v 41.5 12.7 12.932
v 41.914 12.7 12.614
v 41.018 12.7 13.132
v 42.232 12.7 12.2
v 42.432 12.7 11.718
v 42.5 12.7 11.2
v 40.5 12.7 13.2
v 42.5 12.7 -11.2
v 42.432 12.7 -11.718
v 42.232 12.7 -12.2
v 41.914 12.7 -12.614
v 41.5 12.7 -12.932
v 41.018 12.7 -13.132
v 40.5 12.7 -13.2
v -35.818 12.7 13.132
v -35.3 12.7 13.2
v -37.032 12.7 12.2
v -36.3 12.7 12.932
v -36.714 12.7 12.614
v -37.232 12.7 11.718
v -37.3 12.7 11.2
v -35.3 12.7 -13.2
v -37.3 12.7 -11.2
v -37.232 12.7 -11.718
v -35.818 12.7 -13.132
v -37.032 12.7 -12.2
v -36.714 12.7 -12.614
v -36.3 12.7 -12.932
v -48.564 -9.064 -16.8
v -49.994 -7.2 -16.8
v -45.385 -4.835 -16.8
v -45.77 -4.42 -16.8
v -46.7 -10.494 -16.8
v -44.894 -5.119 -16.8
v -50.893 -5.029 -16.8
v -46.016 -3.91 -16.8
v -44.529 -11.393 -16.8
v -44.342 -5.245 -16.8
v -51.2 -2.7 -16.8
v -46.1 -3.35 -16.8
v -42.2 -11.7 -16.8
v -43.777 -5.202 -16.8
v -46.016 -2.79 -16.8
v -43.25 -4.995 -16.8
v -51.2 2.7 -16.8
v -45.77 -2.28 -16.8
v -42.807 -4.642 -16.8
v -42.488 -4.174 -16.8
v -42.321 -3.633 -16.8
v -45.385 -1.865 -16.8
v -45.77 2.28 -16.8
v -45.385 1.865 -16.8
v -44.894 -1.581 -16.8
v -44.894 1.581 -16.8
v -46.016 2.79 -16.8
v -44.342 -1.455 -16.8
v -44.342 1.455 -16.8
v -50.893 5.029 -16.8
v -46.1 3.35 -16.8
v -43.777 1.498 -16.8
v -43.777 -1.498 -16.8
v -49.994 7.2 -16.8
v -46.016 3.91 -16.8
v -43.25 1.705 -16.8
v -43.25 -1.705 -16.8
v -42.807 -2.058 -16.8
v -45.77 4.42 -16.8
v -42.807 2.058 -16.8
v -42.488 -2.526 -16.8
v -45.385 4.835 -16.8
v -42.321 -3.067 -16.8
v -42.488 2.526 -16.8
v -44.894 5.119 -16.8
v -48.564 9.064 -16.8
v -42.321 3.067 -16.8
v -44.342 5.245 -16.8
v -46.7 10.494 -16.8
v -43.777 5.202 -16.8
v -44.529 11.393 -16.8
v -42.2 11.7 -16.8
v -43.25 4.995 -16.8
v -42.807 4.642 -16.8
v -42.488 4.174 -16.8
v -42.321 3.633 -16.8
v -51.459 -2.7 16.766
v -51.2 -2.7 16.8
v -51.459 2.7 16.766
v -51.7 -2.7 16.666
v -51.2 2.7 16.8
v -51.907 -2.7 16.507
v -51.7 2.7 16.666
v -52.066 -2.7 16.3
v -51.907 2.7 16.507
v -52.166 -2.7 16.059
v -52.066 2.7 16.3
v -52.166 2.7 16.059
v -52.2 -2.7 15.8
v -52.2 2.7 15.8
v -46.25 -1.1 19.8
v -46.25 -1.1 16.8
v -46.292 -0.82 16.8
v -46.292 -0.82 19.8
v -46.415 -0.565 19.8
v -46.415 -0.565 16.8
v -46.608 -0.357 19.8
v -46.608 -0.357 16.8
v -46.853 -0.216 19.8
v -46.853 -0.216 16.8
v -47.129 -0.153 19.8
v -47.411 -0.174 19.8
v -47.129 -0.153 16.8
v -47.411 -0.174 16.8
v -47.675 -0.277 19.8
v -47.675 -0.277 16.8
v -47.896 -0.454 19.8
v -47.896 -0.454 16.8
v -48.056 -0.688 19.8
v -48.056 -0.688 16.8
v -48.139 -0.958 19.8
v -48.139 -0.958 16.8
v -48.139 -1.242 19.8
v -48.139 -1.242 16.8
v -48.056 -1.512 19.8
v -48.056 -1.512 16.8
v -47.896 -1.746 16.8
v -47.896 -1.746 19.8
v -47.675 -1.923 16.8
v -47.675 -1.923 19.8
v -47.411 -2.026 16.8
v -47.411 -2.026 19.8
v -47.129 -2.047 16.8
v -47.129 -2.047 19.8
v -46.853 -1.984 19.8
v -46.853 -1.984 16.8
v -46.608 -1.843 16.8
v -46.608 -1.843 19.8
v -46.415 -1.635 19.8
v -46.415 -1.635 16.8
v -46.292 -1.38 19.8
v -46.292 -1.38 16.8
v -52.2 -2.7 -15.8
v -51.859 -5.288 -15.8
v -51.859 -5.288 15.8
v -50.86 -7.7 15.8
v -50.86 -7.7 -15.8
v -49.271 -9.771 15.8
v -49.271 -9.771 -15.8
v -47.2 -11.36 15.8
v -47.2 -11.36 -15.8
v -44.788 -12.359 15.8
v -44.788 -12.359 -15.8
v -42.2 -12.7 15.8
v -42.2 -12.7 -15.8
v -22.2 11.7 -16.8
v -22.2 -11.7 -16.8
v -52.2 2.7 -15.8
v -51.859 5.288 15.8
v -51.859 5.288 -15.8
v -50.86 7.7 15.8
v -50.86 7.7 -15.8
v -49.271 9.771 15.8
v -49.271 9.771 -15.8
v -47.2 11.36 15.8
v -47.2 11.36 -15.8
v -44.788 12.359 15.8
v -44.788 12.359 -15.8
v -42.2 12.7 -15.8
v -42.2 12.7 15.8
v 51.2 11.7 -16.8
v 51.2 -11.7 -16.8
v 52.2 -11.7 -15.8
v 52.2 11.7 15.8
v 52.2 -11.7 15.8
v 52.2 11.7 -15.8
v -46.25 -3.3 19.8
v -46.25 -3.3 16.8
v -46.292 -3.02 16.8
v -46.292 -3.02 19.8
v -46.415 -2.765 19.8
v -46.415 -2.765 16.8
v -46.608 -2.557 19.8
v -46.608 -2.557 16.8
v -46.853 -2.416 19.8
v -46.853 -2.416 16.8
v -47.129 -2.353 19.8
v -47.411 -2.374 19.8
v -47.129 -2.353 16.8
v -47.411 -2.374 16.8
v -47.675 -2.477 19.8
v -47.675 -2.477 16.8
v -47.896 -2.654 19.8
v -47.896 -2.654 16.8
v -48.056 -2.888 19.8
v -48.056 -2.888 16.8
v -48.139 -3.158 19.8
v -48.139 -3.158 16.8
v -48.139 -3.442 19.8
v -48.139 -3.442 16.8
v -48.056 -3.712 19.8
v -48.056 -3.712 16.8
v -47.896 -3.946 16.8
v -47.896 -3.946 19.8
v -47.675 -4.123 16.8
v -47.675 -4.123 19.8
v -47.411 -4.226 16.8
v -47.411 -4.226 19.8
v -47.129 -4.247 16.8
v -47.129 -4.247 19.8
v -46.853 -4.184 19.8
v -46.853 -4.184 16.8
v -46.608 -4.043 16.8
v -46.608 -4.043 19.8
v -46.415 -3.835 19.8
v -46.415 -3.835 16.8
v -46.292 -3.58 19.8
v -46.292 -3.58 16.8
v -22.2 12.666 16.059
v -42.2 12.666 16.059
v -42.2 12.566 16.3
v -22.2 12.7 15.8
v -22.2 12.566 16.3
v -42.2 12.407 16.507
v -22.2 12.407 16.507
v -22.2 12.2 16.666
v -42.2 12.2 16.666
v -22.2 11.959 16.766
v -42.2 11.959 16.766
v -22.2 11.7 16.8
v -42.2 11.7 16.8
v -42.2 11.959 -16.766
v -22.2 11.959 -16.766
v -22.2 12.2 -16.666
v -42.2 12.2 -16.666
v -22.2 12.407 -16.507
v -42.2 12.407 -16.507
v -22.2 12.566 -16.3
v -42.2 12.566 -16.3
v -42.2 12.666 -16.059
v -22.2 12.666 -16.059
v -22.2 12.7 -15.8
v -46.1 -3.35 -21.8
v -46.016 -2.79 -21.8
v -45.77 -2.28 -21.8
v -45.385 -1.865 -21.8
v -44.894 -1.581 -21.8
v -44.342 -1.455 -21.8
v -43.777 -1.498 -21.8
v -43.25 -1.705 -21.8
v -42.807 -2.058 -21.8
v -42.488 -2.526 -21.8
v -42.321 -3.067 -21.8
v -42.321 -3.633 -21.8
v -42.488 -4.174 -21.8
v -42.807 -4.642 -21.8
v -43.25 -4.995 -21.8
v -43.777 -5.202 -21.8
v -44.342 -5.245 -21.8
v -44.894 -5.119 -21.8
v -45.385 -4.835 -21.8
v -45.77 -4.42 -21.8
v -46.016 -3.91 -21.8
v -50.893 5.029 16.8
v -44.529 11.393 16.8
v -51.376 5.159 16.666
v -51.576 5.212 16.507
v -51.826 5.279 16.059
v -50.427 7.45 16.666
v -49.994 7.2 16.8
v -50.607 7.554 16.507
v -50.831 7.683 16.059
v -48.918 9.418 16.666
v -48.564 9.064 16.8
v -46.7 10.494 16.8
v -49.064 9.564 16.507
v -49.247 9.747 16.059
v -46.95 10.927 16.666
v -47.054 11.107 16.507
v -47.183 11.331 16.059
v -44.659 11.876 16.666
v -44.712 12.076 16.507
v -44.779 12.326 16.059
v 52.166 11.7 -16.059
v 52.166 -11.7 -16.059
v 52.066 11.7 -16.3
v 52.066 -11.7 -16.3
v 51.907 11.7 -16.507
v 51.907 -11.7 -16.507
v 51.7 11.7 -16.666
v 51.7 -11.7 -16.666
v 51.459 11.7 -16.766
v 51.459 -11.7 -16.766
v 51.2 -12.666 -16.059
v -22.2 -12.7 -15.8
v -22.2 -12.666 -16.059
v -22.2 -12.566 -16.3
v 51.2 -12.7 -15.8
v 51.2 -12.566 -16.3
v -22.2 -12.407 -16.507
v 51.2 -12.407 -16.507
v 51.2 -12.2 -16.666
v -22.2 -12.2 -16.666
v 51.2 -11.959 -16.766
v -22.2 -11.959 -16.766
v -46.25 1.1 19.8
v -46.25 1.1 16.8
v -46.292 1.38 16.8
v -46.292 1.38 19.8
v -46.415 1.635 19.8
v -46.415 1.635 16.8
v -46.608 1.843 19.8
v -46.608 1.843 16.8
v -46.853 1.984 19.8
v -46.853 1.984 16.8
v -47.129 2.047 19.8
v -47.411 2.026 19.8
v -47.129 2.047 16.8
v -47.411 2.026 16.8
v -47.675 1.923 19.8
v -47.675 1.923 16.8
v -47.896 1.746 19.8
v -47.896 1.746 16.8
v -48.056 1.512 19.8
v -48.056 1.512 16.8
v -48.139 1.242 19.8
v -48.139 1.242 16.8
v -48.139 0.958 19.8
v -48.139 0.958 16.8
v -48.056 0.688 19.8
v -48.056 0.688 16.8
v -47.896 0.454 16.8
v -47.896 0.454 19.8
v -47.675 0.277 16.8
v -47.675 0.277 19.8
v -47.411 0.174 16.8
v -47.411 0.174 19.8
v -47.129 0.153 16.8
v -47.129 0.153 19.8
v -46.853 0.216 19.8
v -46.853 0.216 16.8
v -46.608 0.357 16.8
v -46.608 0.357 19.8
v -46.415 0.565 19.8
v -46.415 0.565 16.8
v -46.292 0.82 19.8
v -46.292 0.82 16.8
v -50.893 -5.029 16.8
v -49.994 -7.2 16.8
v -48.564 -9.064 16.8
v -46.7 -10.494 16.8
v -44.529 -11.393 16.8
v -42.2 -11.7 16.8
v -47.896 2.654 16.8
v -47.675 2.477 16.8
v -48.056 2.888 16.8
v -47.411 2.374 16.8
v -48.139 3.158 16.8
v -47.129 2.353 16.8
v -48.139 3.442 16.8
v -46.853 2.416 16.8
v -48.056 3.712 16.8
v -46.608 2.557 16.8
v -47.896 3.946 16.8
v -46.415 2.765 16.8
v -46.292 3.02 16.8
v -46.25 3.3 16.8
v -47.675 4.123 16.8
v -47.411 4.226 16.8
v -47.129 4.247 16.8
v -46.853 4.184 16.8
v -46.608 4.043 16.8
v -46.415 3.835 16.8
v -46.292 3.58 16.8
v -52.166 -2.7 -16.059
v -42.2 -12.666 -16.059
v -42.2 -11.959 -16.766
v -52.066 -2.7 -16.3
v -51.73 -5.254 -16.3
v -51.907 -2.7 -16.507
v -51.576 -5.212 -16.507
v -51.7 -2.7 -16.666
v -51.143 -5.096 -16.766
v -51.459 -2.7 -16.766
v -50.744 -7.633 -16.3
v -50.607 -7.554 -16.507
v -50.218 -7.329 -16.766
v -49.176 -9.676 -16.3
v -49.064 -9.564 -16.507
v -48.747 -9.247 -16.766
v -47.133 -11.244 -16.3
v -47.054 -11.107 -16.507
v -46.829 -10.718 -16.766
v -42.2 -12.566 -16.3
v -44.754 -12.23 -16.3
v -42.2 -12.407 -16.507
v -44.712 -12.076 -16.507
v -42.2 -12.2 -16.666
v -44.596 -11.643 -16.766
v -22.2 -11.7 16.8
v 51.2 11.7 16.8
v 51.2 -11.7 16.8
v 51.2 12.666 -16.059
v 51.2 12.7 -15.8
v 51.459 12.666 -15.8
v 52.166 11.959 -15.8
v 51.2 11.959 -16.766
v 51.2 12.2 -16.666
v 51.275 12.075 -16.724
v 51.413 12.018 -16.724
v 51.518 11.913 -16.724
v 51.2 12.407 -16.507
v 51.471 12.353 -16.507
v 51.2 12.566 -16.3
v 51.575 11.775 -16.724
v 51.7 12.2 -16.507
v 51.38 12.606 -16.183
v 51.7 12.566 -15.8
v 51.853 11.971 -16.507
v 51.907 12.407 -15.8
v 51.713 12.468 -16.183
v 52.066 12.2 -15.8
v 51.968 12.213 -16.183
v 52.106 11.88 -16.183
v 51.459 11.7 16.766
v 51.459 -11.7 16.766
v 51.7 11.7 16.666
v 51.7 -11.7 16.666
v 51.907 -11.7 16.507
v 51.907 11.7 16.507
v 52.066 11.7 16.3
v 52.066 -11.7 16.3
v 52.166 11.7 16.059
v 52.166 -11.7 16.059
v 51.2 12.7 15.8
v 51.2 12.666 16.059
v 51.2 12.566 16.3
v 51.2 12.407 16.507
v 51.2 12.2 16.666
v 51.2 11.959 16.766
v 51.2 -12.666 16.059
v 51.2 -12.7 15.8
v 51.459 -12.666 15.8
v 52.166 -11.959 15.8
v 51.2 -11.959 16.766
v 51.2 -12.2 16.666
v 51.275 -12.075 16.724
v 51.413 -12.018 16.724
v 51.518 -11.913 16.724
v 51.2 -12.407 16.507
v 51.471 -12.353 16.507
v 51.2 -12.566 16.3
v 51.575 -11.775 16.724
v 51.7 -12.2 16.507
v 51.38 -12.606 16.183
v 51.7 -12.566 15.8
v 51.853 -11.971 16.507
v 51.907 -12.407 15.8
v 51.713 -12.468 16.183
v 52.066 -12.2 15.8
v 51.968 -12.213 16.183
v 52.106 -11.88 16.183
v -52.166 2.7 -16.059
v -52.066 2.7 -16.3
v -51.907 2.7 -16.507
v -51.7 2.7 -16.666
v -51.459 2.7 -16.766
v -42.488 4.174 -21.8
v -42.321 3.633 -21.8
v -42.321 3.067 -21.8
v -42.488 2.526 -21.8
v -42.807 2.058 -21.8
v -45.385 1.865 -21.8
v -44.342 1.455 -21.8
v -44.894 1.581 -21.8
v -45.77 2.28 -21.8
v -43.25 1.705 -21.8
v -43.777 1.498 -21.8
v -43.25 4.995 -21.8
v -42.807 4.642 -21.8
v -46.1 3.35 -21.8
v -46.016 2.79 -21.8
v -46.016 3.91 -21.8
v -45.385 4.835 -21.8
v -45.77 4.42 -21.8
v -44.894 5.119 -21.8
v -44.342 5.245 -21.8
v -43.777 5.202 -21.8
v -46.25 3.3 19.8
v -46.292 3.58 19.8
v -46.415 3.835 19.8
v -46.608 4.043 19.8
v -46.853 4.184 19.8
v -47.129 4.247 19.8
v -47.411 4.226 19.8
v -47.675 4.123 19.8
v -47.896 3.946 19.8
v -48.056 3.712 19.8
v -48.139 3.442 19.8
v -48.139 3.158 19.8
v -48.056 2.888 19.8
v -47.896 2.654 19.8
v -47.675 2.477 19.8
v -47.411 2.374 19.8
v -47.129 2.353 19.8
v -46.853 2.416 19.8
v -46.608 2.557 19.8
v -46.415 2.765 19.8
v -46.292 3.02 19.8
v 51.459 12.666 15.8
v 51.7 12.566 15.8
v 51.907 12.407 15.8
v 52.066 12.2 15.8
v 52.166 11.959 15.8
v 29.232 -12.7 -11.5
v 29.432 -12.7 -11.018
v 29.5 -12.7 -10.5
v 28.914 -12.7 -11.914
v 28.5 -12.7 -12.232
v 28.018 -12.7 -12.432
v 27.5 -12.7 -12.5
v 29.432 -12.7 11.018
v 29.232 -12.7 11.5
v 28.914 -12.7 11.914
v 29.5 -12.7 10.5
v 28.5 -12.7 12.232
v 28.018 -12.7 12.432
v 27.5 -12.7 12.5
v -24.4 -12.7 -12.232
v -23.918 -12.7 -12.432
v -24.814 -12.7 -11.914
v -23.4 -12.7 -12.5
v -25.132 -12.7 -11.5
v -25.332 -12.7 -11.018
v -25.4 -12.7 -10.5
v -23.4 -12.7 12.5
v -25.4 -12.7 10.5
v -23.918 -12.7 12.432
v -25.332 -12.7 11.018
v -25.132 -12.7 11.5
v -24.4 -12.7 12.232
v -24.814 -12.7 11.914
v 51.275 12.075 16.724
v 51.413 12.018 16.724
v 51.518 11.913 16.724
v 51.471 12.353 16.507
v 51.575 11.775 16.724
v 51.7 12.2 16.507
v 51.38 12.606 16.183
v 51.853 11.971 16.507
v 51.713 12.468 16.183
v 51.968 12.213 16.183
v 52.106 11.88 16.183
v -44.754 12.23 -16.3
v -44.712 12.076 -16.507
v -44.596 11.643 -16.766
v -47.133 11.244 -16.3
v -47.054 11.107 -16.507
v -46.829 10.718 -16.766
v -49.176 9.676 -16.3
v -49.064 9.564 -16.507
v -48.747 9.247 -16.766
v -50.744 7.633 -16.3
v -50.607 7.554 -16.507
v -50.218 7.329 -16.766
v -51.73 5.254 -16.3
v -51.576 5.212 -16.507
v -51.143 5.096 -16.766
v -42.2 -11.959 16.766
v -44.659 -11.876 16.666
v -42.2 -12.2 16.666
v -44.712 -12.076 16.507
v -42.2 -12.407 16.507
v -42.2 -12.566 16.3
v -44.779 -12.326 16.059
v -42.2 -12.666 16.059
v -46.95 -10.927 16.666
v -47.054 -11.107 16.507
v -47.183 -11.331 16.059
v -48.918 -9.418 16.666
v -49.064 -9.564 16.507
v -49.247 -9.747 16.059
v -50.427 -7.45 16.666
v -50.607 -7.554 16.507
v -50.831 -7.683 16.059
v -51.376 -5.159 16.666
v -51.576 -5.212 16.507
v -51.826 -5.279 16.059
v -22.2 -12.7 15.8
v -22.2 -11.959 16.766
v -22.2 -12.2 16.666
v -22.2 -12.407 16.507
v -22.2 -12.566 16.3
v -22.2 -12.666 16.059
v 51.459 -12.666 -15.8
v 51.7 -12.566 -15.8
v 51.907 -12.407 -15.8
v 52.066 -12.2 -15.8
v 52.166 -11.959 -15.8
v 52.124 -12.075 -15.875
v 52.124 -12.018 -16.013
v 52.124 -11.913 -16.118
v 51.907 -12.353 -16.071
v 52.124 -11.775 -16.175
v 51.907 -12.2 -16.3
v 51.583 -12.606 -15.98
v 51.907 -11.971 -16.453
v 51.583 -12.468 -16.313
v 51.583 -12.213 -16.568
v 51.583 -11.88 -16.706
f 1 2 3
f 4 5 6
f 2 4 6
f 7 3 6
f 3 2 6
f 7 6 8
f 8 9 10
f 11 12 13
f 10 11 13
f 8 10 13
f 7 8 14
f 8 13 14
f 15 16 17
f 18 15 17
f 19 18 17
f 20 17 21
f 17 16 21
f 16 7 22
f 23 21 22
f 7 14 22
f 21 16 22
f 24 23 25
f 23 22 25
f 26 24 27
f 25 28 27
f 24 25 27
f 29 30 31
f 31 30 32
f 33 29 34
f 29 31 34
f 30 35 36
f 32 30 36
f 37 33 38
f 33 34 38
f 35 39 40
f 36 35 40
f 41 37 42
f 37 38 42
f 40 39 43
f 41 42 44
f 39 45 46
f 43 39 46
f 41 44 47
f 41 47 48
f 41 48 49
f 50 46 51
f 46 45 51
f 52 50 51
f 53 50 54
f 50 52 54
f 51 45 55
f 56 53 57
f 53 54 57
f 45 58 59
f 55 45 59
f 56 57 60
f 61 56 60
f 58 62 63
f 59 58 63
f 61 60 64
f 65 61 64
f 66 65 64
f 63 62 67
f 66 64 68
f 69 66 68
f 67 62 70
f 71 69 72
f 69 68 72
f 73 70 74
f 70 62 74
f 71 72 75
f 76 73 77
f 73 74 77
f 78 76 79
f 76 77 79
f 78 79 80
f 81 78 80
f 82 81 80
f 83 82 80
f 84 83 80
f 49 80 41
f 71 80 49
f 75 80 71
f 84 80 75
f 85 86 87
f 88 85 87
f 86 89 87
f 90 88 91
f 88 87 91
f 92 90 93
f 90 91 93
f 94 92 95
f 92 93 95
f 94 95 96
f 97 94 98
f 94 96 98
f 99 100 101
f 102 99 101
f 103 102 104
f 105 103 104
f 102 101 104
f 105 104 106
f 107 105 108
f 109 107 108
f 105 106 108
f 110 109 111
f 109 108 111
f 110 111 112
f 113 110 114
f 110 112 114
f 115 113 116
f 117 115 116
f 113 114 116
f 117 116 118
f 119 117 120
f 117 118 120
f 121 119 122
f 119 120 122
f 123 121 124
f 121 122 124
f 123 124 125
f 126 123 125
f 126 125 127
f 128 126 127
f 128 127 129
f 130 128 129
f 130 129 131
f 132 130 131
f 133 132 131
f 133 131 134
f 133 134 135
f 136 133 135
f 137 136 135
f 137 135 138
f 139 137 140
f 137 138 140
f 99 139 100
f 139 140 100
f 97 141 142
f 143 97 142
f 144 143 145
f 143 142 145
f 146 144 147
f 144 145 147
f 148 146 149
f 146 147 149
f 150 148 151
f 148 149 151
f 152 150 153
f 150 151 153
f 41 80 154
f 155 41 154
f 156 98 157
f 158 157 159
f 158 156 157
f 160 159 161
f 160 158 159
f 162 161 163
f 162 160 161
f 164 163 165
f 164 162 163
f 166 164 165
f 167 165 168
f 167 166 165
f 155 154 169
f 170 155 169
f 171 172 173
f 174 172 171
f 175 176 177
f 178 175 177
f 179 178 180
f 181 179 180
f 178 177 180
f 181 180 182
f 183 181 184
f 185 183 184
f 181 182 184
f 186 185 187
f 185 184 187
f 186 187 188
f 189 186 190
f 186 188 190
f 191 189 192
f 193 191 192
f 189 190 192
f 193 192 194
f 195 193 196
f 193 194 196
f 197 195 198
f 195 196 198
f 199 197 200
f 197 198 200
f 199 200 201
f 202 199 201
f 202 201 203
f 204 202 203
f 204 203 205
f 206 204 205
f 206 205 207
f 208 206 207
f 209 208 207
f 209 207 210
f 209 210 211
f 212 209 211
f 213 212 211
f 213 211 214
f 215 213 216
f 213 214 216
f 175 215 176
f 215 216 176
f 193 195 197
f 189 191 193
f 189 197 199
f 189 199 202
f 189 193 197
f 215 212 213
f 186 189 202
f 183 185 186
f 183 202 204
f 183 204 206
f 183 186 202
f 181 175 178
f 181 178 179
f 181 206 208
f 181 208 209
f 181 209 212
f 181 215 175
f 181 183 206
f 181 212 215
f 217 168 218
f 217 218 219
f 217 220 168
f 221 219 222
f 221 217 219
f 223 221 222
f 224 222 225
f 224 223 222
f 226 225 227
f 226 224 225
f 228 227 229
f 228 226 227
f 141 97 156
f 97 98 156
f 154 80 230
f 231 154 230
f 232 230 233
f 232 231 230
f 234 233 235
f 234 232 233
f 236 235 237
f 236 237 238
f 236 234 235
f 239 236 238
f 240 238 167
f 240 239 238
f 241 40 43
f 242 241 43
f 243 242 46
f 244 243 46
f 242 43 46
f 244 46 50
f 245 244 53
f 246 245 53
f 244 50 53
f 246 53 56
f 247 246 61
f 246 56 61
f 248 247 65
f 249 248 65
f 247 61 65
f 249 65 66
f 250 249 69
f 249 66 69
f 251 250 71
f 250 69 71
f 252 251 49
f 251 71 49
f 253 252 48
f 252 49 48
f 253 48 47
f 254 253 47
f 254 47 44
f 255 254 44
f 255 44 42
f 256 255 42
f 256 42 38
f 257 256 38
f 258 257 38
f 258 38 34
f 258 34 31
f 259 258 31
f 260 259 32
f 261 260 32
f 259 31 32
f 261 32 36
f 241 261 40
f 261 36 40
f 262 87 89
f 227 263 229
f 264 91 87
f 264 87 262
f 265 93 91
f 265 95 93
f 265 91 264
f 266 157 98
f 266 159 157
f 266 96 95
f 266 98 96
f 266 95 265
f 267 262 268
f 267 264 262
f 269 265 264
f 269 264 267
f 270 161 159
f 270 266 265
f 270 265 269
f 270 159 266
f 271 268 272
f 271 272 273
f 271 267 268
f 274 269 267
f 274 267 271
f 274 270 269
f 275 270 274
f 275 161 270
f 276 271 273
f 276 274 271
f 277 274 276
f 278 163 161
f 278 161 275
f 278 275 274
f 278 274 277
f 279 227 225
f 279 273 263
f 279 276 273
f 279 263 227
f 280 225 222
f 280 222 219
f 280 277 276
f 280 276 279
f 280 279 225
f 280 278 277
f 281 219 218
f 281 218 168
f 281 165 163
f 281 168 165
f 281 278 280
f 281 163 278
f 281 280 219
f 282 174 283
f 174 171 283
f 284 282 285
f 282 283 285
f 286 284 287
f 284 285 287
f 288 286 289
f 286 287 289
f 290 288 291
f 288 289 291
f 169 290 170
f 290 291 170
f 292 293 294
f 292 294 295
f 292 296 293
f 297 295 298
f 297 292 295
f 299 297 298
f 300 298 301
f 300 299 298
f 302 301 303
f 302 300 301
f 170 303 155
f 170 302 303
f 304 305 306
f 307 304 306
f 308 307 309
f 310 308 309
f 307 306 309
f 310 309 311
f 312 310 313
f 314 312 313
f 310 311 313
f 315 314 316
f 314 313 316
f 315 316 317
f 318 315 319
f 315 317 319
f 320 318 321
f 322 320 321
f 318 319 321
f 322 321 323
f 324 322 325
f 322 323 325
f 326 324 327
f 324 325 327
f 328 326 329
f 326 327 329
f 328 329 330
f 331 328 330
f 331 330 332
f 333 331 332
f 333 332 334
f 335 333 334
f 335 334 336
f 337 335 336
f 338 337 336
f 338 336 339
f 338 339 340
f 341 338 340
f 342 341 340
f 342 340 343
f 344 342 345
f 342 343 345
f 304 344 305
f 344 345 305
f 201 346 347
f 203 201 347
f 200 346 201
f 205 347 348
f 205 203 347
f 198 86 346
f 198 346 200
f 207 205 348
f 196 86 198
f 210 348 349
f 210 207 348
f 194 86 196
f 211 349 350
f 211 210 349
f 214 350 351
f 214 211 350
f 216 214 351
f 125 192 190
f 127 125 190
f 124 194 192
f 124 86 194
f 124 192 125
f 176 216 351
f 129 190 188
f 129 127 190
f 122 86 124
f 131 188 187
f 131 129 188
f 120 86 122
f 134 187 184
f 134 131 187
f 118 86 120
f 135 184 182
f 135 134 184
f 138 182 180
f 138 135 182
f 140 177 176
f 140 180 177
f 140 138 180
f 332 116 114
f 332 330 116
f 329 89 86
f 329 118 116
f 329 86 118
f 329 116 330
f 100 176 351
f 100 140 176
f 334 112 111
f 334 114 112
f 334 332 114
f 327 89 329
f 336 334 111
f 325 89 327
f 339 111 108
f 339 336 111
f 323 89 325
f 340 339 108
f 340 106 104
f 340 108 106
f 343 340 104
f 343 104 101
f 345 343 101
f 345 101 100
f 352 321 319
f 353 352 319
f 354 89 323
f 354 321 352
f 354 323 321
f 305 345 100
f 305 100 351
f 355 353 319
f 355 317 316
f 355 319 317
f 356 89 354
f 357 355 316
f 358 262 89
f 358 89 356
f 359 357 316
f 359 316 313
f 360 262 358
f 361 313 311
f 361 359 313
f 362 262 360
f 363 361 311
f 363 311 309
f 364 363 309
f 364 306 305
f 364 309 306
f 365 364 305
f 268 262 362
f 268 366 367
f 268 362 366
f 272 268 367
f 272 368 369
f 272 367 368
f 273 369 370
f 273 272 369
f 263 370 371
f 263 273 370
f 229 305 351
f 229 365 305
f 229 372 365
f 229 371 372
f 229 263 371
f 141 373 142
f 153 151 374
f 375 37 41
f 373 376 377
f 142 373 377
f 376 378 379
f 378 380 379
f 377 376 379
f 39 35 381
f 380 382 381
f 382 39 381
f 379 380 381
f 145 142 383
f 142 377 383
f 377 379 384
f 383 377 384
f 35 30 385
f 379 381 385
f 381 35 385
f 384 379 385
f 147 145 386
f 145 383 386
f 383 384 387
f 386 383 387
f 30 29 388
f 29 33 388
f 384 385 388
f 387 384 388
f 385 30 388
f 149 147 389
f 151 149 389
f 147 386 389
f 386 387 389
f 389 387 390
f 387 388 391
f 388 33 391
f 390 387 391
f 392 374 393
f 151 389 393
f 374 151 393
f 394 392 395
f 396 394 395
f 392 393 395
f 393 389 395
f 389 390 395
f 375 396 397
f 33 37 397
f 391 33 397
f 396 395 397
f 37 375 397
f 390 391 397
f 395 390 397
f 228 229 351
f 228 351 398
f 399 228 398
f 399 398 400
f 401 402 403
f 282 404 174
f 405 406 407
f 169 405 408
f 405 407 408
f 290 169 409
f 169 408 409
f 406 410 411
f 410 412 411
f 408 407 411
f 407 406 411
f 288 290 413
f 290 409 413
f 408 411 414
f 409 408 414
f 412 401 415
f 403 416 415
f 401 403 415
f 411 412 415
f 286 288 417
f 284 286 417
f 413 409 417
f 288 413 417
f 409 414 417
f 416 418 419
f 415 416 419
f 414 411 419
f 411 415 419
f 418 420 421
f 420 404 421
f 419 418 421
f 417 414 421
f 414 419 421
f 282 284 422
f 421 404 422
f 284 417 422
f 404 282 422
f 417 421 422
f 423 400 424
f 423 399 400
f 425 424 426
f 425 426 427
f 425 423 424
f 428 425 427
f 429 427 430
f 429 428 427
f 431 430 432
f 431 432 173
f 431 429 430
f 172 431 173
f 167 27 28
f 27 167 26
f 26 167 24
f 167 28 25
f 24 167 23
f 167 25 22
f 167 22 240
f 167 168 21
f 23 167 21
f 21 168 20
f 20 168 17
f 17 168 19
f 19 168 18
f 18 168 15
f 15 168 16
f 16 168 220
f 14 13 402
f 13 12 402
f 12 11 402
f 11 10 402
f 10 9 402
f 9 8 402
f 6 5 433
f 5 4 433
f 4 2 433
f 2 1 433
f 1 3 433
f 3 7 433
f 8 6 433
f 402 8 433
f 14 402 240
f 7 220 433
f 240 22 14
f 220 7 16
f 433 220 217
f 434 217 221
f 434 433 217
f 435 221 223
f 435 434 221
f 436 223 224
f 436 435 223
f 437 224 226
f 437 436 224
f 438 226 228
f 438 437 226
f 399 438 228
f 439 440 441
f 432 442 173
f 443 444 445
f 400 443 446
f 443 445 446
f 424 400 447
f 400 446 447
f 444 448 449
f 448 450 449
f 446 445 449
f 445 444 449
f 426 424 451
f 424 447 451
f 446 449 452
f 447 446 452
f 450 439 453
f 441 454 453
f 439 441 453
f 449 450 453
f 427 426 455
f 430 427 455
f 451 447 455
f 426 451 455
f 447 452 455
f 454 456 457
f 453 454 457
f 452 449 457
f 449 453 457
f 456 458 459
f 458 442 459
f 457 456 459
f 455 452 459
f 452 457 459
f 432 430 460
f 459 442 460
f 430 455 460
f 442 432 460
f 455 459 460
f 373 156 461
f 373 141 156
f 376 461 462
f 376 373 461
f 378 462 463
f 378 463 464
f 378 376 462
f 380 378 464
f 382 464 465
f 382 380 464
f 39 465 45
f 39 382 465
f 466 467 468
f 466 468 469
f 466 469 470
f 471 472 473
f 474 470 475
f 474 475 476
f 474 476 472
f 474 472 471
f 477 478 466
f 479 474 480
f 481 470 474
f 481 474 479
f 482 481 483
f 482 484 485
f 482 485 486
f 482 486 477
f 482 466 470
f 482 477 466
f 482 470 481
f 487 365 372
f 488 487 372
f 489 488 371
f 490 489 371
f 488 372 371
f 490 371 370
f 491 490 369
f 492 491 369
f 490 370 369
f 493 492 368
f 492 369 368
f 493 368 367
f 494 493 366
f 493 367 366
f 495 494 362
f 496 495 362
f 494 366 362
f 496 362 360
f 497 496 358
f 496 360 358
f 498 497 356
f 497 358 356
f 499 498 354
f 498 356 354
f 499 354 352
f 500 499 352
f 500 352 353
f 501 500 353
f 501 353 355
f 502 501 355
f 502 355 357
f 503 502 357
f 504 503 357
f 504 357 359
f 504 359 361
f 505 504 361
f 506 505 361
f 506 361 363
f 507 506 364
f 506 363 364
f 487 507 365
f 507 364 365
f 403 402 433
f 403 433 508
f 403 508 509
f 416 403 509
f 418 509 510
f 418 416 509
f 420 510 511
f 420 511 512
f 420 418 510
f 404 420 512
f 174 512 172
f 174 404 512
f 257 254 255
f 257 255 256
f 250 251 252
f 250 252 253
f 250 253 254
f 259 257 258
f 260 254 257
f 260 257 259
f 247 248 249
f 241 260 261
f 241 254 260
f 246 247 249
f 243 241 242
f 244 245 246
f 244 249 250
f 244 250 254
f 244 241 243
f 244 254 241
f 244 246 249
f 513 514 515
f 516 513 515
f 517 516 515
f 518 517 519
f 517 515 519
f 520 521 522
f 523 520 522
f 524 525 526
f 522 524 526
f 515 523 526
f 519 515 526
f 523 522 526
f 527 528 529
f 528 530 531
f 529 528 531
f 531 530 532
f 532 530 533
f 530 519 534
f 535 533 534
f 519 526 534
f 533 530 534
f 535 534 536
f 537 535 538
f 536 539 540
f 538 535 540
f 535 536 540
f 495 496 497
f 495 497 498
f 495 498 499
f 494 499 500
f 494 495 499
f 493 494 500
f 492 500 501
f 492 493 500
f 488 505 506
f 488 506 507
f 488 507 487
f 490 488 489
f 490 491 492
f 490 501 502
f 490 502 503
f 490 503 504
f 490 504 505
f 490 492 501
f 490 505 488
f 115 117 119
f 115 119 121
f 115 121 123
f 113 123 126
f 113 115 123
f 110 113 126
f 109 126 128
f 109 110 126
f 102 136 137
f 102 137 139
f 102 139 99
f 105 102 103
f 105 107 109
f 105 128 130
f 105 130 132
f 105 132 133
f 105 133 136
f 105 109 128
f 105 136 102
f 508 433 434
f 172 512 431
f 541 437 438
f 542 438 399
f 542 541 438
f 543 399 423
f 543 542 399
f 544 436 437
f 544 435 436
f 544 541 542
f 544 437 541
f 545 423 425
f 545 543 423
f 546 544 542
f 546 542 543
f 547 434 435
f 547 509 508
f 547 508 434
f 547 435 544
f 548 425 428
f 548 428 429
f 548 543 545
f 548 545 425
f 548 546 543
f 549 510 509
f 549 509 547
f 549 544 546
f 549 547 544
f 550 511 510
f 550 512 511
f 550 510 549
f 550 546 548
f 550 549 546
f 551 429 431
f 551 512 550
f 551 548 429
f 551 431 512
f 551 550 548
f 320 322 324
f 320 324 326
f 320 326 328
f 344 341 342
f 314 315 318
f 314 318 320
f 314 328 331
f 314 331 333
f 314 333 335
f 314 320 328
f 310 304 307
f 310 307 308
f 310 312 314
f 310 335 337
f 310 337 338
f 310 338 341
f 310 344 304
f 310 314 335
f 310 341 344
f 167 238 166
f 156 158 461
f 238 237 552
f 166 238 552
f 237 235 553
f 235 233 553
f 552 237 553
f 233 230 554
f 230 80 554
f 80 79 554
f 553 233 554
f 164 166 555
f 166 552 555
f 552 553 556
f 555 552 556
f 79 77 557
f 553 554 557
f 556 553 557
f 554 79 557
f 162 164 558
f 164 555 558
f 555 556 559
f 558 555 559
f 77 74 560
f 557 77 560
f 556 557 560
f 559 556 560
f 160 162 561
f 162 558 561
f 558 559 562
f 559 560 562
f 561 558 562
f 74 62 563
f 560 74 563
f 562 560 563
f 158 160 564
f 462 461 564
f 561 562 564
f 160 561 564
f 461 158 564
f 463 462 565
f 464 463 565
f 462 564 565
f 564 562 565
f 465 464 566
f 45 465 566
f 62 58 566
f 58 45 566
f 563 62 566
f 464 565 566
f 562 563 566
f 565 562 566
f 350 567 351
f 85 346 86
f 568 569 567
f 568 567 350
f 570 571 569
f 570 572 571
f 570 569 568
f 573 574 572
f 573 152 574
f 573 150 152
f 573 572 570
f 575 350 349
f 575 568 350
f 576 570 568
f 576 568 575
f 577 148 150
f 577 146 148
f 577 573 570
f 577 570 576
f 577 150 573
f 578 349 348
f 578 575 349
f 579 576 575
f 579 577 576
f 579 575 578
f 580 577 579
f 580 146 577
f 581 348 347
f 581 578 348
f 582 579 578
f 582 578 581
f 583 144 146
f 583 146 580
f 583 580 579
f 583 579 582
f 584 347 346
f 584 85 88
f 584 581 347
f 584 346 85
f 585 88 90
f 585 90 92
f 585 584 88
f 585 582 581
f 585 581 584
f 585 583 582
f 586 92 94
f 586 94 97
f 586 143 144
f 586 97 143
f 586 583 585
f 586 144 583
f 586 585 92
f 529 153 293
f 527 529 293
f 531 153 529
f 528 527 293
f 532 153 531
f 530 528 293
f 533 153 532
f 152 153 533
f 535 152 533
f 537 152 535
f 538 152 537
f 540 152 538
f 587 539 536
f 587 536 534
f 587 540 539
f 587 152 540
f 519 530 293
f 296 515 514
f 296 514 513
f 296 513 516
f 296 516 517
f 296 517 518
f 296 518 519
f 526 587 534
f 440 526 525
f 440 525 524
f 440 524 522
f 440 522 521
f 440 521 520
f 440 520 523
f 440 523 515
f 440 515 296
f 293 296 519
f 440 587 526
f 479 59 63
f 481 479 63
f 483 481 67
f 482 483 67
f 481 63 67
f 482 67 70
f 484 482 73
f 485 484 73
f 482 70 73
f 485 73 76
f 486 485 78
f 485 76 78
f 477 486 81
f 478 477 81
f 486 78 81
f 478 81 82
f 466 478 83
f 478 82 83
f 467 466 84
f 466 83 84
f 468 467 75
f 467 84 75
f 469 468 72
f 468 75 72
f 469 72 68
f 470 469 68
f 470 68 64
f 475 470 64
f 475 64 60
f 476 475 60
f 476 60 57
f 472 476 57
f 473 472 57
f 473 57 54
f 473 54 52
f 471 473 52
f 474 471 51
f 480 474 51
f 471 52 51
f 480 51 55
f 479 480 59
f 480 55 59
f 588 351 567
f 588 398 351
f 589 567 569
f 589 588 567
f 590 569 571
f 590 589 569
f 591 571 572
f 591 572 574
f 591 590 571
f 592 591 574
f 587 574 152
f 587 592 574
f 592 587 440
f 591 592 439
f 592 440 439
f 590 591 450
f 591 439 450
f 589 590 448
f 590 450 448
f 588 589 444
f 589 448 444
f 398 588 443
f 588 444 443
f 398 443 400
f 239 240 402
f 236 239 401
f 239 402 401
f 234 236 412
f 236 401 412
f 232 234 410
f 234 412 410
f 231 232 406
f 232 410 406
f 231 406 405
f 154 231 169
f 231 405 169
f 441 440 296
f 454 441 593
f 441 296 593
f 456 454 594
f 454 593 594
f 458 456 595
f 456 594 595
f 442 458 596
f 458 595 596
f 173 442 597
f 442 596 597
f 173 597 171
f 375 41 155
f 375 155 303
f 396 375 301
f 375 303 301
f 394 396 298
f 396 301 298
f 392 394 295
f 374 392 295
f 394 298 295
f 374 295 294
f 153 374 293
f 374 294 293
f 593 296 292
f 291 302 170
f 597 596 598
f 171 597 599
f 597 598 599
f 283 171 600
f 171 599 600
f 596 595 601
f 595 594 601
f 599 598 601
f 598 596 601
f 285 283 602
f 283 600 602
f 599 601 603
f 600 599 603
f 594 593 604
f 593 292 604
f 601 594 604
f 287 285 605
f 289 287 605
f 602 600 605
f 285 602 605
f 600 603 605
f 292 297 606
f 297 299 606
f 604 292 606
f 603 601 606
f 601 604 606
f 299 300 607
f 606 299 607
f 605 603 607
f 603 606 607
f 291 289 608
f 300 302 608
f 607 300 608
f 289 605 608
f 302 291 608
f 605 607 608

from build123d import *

# Parameters (mm, degrees)
SKETCH1_W           = 104.4
SKETCH1_H           = 33.6
BOSS_EXTRUDE1_DEPTH = 12.7
FILLET1_R           = 10
SKETCH2_R           = 1.9
BOSS_EXTRUDE2_DEPTH = 5
SKETCH4_R           = 0.95
BOSS_EXTRUDE3_DEPTH = 3
SKETCH5_W           = 20
SKETCH5_H           = 25.4
BOSS_EXTRUDE4_DEPTH = 0.0001
BOSS_EXTRUDE5_DEPTH = 0.0001
BOSS_EXTRUDE6_DEPTH = 0.0001
FILLET7_R           = 1
FILLET8_R           = 1


with BuildPart() as part:
    # Sketch1 → Boss-Extrude1 (new body, symmetric)
    with BuildSketch(Plane(origin=(0, 0, 0), x_dir=(1, 0, 0), z_dir=(0, 1, 0))):
        Rectangle(SKETCH1_W, SKETCH1_H)
    extrude(amount=BOSS_EXTRUDE1_DEPTH, both=True)

    # Fillet1
    fillet1_edges = [part.edges().sort_by_distance(p)[0] for p in [
        (-52.2, 12.7, 0),
        (-52.2, -12.7, 0),
    ]]
    fillet(fillet1_edges, radius=FILLET1_R)

    # Sketch2 → Boss-Extrude2 (add)
    with BuildSketch(Plane(origin=(0, 0, -16.8), x_dir=(-1, 0, 0), z_dir=(0, 0, -1))):
        with Locations((44.2, 3.35)):
            Circle(SKETCH2_R)
        with Locations((44.2, -3.35)):
            Circle(SKETCH2_R)
    extrude(amount=BOSS_EXTRUDE2_DEPTH)

    # Sketch4 → Boss-Extrude3 (add)
    with BuildSketch(Plane.XY.offset(16.8)):
        with Locations((-47.2, 3.3)):
            Circle(SKETCH4_R)
        with Locations((-47.2, 1.1)):
            Circle(SKETCH4_R)
        with Locations((-47.2, -1.1)):
            Circle(SKETCH4_R)
        with Locations((-47.2, -3.3)):
            Circle(SKETCH4_R)
    extrude(amount=BOSS_EXTRUDE3_DEPTH)

    # Sketch5 → Boss-Extrude4 (add)
    with BuildSketch(Plane.XY.offset(16.8)):
        with Locations((-32.2, 0)):
            Rectangle(SKETCH5_W, SKETCH5_H)
    boss_extrude4 = extrude(amount=BOSS_EXTRUDE4_DEPTH)

    # Mirror1: Boss-Extrude4 across plane
    add(boss_extrude4.mirror(Plane.XY))

    # Mirror1 at the second plane: Boss-Extrude4 across plane
    add(boss_extrude4.mirror(Plane.ZX))

    # Sketch6 → Boss-Extrude5 (add)
    with BuildSketch(Plane(origin=(0, 12.7, 0), x_dir=(1, 0, 0), z_dir=(0, 1, 0))):
        with BuildLine():
            Line((-35.3, 13.2), (40.5, 13.2))
            ThreePointArc((40.5, 13.2), (41.914213562, 12.614213562), (42.5, 11.2))
            Line((42.5, 11.2), (42.5, -11.2))
            ThreePointArc((42.5, -11.2), (41.914213562, -12.614213562), (40.5, -13.2))
            Line((40.5, -13.2), (-35.3, -13.2))
            ThreePointArc((-35.3, -13.2), (-36.714213562, -12.614213562), (-37.3, -11.2))
            Line((-37.3, -11.2), (-37.3, 11.2))
            ThreePointArc((-37.3, 11.2), (-36.714213562, 12.614213562), (-35.3, 13.2))
        make_face()
    extrude(amount=BOSS_EXTRUDE5_DEPTH)

    # Sketch7 → Boss-Extrude6 (add)
    with BuildSketch(Plane.XZ.offset(12.7)):
        with BuildLine():
            Line((-23.4, 12.5), (27.5, 12.5))
            ThreePointArc((27.5, 12.5), (28.914213562, 11.914213562), (29.5, 10.5))
            Line((29.5, 10.5), (29.5, -10.5))
            ThreePointArc((29.5, -10.5), (28.914213562, -11.914213562), (27.5, -12.5))
            Line((27.5, -12.5), (-23.4, -12.5))
            ThreePointArc((-23.4, -12.5), (-24.814213562, -11.914213562), (-25.4, -10.5))
            Line((-25.4, -10.5), (-25.4, 10.5))
            ThreePointArc((-25.4, 10.5), (-24.814213562, 11.914213562), (-23.4, 12.5))
        make_face()
    extrude(amount=BOSS_EXTRUDE6_DEPTH)

    # Fillet7
    fillet7_edges = [part.edges().sort_by_distance(p)[0] for p in [
        (52.2, 12.7, 0),
        (-52.2, 0, 16.8),
        (-52.2, 0, -16.8),
        (15, 12.7, -16.8),
        (-49.271067812, 9.771067812, 16.8),
        (-49.271067812, -9.771067812, 16.8),
        (-49.271067812, 9.771067812, -16.8),
        (-49.271067812, -9.771067812, -16.8),
        (15, -12.7, -16.8),
        (52.2, -12.7, 0),
        (15, -12.7, 16.8),
        (15, 12.7, 16.8),
        (52.2, 0, -16.8),
        (52.2, 0, 16.8),
    ]]
    fillet(fillet7_edges, radius=FILLET7_R)

    # Fillet8
    fillet8_edges = [part.edges().sort_by_distance(p)[0] for p in [
        (-32.2, -12.7, 16.8001),
        (-32.2, 12.7, 16.8001),
        (-32.2, 12.7, -16.8001),
        (-32.2, -12.7, -16.8001),
    ]]
    fillet(fillet8_edges, radius=FILLET8_R)


solid = part.part
